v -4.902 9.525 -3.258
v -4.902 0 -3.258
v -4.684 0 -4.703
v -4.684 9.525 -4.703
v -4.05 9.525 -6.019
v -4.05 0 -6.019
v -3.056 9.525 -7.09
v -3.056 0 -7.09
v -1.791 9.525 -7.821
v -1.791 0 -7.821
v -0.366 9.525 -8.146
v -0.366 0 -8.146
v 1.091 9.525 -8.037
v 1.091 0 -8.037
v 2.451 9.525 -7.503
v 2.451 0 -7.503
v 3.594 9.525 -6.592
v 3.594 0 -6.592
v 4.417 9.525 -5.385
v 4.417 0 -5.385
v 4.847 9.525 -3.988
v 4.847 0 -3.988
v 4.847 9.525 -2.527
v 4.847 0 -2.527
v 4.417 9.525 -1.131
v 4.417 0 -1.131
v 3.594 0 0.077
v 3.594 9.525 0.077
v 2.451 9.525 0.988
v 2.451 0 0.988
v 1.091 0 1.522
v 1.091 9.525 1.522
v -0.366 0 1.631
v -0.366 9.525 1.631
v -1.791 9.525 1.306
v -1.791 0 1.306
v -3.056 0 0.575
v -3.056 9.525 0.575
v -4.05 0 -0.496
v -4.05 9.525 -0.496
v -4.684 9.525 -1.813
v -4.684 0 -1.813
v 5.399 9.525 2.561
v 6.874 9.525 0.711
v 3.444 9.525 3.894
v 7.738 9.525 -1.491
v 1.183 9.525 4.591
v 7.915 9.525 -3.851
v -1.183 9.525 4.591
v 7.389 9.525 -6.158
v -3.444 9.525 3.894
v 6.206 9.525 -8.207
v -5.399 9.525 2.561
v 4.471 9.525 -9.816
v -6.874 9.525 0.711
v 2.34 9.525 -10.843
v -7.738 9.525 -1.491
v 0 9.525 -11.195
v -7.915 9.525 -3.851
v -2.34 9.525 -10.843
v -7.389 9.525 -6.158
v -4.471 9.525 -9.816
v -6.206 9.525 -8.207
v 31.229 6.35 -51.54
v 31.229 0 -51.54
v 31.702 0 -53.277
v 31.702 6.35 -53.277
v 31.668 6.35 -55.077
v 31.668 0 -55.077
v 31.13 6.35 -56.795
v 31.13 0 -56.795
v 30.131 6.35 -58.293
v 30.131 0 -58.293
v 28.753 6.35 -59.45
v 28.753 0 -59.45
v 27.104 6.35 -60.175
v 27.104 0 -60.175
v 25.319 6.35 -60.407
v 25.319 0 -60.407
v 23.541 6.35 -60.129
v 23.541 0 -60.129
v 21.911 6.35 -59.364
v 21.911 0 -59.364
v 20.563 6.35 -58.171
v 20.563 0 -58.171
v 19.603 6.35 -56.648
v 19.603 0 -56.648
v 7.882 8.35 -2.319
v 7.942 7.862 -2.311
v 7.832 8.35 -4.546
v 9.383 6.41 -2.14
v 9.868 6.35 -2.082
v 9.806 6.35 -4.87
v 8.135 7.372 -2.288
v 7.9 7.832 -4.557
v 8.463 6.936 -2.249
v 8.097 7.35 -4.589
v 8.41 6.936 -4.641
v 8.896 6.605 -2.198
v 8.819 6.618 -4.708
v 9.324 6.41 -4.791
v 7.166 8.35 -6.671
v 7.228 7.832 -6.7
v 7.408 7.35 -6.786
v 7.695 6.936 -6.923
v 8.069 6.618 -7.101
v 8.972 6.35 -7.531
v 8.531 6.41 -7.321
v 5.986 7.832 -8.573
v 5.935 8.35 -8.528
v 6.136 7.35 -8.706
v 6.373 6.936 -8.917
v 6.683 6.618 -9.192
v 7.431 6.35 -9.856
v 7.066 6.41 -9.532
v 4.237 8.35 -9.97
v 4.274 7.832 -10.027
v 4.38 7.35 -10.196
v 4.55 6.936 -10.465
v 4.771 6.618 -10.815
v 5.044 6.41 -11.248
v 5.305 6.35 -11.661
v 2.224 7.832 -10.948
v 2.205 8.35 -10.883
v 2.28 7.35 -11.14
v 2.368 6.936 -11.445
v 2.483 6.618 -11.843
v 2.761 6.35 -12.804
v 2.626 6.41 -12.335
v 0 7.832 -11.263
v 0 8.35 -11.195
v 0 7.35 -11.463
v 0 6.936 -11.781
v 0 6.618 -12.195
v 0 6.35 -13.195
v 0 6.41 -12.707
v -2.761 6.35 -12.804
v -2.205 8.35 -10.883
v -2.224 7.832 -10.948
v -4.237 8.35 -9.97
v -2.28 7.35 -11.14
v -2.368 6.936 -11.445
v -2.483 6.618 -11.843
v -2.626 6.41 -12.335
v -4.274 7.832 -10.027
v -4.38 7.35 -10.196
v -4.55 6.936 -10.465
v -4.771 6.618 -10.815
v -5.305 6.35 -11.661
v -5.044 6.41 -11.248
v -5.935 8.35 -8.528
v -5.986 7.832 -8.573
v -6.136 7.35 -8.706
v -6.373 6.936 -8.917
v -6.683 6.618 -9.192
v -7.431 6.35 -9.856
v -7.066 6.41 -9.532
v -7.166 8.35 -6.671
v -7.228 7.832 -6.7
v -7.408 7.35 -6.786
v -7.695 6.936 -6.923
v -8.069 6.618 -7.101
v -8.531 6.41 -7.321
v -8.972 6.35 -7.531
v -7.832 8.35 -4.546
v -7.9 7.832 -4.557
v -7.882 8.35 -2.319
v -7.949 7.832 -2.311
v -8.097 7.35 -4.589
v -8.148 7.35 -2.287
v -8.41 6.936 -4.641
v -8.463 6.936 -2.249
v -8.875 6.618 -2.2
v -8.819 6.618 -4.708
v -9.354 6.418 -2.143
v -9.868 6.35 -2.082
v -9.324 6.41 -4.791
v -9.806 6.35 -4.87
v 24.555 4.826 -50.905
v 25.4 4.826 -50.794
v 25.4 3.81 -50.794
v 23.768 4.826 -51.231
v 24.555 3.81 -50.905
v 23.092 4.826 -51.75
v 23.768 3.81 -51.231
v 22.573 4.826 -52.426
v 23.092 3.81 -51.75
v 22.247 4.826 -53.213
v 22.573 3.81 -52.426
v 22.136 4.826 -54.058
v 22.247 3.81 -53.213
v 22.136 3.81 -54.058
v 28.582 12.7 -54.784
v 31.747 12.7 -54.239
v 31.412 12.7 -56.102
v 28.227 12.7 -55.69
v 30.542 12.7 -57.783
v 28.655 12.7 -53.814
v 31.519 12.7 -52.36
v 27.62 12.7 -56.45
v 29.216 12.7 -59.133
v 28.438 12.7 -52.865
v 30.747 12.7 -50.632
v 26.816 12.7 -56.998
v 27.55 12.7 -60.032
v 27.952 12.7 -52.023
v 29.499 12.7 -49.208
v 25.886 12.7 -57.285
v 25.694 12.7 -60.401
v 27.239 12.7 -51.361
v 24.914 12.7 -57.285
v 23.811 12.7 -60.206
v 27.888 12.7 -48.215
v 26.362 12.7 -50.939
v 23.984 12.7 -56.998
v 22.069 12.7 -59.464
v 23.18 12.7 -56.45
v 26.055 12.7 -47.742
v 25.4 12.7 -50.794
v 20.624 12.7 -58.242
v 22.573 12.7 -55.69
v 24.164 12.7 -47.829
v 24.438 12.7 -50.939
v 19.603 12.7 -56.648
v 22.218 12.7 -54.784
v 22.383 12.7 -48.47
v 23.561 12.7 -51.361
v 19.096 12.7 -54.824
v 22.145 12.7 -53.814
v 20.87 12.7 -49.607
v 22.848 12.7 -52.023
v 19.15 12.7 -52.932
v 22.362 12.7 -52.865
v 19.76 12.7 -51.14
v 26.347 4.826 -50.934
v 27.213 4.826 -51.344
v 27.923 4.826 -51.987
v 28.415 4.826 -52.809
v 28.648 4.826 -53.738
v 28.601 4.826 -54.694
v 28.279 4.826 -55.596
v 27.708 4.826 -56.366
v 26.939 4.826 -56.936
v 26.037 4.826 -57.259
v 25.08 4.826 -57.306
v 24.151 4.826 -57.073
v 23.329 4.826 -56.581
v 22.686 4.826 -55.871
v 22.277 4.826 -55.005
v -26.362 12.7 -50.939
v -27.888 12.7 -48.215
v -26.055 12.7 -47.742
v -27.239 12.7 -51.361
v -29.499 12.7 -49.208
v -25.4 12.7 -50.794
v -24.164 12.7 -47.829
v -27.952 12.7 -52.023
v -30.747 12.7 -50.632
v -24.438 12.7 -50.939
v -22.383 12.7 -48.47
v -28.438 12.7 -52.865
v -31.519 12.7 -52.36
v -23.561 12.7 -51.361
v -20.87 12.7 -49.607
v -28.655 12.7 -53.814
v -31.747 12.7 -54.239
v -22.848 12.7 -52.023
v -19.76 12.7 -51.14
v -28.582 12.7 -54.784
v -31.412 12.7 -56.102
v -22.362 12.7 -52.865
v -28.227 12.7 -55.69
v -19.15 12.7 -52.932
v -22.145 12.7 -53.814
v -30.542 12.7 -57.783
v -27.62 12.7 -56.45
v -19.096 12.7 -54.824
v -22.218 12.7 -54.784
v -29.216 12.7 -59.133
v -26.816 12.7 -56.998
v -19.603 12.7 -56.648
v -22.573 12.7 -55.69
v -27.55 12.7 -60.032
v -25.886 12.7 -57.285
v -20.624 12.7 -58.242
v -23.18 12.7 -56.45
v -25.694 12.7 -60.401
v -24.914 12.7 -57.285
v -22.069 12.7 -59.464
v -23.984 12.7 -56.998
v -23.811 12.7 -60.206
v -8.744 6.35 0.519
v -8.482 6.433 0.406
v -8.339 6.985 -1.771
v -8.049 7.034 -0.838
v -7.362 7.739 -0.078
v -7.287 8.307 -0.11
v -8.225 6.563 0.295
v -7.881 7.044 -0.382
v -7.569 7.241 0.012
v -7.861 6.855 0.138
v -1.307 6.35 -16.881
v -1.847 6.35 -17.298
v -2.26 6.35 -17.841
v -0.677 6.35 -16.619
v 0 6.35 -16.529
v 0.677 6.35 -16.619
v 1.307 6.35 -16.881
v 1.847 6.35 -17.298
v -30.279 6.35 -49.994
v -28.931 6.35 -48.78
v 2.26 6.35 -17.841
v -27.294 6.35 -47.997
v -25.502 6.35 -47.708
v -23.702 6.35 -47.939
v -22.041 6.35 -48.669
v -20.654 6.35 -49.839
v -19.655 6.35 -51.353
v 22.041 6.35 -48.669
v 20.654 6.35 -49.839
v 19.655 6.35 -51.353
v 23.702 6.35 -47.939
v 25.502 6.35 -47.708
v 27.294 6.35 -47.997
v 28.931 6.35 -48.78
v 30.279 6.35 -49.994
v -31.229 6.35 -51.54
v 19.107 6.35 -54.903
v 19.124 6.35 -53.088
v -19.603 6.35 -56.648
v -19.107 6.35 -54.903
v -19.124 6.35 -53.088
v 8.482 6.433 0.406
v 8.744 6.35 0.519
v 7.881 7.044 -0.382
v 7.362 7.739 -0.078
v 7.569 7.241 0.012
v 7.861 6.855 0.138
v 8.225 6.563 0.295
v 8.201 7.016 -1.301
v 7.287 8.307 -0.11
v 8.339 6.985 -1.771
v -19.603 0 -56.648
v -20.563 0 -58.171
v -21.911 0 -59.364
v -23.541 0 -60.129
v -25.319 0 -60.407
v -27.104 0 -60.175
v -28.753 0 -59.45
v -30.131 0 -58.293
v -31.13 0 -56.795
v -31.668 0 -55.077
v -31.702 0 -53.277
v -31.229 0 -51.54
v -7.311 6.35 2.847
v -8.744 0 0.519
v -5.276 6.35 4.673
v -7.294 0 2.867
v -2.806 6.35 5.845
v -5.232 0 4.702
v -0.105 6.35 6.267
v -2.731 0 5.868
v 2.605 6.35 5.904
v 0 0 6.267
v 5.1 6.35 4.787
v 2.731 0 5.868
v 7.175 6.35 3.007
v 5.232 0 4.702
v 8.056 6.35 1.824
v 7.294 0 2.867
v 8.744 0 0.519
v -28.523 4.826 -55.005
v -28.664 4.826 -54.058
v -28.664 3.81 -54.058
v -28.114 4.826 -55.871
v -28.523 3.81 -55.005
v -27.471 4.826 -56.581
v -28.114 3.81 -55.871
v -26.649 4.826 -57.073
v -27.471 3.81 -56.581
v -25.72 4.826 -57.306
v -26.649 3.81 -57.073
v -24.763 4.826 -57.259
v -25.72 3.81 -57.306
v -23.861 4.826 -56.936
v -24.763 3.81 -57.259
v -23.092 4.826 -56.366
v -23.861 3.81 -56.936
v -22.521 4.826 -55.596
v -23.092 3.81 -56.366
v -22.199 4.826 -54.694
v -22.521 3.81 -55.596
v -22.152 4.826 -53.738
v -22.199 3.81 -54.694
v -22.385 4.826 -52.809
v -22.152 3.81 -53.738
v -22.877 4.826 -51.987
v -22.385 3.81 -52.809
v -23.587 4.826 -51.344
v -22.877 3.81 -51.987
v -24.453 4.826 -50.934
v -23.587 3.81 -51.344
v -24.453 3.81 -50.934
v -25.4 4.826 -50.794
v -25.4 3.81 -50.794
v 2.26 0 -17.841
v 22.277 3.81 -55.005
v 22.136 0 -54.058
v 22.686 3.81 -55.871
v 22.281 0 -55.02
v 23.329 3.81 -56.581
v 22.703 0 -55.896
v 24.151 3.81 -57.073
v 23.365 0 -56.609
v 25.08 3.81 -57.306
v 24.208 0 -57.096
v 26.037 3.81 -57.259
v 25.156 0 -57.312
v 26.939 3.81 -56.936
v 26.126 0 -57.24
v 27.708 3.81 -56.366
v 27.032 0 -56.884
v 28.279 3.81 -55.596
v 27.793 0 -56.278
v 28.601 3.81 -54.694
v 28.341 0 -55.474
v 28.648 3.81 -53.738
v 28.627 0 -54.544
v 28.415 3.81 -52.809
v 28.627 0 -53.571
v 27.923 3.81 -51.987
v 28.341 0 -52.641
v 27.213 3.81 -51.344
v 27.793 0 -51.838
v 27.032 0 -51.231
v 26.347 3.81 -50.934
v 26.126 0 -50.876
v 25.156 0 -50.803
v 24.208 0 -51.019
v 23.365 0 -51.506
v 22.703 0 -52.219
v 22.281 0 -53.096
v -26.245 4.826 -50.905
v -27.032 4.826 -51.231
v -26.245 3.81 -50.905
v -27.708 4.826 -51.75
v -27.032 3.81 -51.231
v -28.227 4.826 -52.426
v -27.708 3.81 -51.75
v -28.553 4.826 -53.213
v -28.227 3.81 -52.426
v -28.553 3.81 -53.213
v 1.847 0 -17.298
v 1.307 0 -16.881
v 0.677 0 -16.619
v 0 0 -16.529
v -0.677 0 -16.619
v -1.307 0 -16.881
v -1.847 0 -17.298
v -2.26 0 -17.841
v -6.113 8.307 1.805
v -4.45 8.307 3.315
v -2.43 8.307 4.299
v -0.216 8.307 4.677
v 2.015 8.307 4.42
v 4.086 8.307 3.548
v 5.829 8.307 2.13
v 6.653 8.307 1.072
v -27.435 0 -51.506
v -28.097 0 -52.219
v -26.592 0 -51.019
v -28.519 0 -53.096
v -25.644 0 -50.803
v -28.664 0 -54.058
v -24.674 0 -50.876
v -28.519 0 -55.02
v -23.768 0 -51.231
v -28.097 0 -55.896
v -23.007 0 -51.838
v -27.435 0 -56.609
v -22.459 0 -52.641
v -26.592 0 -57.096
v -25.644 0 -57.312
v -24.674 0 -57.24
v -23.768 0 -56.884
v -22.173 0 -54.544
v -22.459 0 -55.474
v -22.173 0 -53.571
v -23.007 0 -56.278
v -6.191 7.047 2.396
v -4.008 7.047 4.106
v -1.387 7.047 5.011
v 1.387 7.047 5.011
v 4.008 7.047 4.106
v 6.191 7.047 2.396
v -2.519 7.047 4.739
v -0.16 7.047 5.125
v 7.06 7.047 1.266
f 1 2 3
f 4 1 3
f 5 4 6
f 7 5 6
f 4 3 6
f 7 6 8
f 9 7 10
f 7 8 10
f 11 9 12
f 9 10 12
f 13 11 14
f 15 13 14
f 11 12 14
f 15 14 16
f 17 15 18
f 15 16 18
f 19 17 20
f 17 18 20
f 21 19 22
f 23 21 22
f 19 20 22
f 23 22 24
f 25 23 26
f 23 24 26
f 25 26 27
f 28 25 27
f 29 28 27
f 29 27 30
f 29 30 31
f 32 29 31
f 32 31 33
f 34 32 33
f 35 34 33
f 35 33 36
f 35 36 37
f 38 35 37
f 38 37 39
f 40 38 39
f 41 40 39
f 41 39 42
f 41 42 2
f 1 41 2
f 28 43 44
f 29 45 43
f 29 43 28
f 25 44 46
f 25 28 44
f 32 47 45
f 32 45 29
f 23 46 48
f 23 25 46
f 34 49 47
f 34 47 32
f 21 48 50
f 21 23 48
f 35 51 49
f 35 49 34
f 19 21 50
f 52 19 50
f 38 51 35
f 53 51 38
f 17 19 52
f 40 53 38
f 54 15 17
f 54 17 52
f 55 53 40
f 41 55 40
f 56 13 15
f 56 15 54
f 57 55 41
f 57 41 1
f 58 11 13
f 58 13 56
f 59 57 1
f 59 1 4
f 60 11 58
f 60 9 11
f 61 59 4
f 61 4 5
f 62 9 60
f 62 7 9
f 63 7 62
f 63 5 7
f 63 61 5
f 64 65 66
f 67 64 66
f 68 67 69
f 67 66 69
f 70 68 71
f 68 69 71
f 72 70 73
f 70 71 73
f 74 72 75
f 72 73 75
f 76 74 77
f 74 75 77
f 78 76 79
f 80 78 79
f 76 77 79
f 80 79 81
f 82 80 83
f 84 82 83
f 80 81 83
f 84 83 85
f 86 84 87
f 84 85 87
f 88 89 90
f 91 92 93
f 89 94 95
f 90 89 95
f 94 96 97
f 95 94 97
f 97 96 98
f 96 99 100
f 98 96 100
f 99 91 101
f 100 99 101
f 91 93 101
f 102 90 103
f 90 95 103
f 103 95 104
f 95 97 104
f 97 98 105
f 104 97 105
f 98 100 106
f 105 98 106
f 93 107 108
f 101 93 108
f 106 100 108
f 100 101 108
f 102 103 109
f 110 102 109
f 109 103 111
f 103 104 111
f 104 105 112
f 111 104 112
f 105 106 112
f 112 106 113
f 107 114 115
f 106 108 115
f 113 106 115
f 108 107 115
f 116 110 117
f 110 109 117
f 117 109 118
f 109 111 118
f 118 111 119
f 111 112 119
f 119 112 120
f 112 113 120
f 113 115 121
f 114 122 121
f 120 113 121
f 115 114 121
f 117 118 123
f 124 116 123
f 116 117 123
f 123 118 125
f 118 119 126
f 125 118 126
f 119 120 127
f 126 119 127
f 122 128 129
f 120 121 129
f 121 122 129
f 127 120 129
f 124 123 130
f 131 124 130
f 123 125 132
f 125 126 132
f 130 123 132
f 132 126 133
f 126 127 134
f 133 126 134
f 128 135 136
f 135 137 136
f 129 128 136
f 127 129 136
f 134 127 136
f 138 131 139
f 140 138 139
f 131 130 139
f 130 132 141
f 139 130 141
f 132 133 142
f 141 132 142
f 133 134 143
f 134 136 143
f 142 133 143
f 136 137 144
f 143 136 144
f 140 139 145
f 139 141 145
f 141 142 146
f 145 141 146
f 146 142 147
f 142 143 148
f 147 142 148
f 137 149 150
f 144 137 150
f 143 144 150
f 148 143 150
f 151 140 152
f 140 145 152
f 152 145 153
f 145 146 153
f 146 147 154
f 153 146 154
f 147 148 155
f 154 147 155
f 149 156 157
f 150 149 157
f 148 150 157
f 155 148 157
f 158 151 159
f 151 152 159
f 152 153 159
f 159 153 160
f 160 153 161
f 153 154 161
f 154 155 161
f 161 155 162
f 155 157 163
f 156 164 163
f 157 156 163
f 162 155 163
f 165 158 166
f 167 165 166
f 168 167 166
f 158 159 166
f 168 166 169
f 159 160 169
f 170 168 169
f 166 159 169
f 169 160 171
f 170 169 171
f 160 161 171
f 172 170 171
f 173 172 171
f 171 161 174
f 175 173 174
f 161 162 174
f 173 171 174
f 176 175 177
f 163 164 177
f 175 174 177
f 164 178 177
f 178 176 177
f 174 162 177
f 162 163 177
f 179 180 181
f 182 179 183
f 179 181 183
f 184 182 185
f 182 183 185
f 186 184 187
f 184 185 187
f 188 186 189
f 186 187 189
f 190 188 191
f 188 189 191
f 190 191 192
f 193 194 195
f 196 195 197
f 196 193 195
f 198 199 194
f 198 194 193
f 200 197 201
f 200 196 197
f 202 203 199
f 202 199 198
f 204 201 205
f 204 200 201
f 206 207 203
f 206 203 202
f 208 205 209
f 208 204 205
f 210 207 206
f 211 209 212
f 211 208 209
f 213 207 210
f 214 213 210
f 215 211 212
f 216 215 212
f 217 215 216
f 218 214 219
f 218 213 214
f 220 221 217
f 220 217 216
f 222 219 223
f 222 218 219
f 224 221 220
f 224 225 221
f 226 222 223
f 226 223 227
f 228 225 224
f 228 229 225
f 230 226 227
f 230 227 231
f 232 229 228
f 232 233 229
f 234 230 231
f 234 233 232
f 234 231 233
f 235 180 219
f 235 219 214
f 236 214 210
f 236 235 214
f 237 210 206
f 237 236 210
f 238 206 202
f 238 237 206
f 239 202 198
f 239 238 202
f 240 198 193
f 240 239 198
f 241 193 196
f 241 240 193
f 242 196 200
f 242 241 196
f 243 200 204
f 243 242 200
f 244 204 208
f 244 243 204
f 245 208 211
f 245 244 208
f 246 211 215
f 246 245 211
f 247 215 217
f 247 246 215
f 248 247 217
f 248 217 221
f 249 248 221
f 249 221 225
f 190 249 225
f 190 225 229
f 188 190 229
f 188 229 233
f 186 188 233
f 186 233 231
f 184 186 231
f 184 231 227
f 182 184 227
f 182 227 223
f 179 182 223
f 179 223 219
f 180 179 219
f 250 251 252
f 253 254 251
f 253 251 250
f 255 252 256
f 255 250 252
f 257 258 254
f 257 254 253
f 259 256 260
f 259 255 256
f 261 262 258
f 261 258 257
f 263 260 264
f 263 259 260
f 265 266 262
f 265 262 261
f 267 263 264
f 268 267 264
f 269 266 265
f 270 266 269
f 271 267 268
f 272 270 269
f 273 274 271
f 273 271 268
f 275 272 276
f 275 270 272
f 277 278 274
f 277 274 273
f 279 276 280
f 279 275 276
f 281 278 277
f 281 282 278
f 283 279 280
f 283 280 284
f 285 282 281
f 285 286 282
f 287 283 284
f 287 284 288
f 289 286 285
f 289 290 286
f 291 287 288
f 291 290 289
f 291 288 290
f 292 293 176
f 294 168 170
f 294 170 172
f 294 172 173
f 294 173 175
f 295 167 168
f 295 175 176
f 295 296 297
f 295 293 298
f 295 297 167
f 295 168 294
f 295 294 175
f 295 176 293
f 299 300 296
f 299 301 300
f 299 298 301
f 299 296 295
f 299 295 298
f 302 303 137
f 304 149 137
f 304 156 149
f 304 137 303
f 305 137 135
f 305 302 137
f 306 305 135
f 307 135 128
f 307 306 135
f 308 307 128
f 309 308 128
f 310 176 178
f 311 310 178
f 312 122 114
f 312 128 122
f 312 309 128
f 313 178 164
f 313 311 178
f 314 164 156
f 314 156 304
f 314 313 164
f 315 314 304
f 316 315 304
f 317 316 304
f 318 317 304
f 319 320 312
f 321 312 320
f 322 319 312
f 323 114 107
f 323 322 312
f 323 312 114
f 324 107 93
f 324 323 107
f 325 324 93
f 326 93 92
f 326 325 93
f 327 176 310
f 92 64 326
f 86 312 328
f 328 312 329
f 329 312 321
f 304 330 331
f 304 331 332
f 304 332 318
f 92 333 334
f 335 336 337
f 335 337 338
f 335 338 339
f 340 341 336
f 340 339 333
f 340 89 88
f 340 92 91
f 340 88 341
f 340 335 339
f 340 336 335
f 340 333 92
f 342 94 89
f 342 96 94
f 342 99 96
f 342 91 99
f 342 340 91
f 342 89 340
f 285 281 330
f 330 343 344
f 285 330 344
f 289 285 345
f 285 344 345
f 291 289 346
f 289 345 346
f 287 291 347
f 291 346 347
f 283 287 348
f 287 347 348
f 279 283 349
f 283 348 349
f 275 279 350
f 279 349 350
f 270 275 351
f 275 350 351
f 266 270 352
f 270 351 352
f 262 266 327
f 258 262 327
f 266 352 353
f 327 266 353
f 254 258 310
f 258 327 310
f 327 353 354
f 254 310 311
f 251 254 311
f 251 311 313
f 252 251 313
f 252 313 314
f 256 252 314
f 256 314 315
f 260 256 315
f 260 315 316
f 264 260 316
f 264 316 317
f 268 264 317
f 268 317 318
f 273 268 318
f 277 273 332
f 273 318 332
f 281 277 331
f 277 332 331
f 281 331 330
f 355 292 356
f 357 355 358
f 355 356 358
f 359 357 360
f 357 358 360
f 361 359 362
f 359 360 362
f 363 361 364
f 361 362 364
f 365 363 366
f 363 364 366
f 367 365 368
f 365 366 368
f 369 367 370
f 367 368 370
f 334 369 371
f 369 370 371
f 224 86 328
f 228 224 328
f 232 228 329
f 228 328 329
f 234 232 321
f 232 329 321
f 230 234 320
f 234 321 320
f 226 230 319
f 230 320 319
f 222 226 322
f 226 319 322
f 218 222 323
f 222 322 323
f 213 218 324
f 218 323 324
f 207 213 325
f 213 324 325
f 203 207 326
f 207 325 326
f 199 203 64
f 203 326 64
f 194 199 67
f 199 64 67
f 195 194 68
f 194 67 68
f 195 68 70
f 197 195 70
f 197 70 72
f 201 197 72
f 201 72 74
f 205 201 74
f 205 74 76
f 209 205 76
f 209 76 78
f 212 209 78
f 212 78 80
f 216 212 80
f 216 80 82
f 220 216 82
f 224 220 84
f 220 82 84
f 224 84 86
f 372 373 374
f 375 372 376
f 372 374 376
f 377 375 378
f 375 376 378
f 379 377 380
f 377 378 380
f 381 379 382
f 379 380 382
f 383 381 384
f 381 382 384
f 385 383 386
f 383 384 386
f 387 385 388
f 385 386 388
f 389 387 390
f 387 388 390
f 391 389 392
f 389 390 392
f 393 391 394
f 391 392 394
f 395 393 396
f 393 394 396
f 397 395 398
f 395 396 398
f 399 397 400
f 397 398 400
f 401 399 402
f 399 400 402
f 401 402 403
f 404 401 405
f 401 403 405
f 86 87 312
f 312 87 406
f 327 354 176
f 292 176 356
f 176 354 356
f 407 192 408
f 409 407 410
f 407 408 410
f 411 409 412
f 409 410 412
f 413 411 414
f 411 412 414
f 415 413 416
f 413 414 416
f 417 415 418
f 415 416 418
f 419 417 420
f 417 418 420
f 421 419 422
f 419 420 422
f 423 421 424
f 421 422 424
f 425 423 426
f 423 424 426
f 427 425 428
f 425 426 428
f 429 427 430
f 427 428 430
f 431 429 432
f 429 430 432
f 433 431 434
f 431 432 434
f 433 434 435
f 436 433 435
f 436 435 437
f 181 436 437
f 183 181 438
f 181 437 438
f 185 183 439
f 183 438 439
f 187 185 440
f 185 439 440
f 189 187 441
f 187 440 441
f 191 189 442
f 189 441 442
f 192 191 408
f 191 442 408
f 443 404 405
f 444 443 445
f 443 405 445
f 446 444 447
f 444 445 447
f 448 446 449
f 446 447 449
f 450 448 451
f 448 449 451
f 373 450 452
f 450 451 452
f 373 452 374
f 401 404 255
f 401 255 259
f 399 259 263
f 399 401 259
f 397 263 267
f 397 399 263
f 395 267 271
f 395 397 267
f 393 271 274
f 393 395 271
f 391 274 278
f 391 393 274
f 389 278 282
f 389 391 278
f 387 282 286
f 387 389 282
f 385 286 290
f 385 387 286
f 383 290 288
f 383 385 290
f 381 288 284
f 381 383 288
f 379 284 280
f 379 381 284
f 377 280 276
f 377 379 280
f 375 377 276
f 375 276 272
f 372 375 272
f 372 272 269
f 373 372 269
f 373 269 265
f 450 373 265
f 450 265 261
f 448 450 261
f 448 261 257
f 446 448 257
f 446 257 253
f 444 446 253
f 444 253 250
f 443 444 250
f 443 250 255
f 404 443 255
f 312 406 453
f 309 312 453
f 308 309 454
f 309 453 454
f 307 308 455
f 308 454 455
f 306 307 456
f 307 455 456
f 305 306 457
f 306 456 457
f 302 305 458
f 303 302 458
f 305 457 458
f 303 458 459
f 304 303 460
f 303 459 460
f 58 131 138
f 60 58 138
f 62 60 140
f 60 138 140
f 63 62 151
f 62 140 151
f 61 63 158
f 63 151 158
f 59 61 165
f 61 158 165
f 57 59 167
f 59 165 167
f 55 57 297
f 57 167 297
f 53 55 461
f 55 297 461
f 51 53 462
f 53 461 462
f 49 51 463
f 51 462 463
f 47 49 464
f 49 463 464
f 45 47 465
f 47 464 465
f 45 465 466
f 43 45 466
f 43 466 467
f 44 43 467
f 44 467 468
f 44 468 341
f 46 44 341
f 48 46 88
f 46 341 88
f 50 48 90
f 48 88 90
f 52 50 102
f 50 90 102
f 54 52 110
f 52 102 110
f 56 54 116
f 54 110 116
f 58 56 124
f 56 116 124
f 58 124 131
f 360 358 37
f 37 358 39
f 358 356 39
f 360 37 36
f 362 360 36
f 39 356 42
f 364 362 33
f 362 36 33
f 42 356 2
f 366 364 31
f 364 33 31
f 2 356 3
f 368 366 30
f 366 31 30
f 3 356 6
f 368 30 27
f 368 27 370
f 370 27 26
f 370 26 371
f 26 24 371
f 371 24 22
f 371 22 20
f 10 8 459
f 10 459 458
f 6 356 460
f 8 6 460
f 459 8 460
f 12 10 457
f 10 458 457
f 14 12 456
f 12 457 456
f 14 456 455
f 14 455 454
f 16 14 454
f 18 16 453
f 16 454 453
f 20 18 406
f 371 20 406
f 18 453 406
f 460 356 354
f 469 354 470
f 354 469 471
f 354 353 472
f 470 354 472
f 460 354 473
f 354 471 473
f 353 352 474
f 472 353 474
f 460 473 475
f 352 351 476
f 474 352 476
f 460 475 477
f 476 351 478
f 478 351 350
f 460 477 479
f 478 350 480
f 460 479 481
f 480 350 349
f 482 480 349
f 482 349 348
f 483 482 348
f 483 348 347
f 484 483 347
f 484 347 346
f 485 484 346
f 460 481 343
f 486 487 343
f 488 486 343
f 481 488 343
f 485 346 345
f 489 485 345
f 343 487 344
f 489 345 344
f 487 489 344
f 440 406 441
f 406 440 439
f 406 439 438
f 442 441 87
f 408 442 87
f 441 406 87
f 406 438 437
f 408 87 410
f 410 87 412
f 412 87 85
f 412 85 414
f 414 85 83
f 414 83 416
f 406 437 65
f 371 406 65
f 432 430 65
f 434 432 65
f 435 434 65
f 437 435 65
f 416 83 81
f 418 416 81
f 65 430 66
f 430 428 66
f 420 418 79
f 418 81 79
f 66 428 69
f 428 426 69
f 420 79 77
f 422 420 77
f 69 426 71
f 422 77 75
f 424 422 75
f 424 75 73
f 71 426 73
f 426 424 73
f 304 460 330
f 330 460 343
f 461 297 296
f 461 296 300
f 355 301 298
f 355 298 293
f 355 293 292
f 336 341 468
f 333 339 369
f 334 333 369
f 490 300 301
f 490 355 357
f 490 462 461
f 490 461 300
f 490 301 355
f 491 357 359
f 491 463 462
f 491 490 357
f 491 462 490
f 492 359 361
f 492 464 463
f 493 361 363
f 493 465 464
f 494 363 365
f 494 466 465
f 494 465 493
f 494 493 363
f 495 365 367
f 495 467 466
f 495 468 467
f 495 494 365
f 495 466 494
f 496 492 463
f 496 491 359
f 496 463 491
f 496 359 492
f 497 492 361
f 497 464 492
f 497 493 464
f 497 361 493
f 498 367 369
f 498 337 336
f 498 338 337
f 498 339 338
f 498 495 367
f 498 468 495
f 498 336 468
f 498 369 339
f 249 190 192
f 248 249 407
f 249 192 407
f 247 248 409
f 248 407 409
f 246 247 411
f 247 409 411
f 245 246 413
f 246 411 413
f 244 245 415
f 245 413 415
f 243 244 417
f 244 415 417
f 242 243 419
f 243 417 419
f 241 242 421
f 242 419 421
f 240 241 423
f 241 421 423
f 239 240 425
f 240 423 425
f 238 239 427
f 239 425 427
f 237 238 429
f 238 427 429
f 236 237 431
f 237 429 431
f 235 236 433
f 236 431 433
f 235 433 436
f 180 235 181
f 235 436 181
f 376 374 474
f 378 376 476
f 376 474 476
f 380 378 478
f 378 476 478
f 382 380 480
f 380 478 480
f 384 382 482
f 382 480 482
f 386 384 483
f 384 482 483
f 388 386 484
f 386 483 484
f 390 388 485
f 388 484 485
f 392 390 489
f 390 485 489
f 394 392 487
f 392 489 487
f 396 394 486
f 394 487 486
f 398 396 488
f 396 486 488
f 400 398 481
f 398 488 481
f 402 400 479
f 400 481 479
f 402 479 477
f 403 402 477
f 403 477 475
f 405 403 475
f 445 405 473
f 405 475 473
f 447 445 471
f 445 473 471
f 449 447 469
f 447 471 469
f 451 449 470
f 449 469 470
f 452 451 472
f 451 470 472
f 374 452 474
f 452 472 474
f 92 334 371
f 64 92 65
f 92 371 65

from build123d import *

# Parameters (mm, degrees)
SKETCH1_R                            = 7.9375
BOSS_EXTRUDE1_DEPTH                  = 6.35
F_0_257_DIAMETER_HOLE1_D             = 6.5278
SKETCH1_3_R                          = 7.9375
BOSS_EXTRUDE2_DEPTH                  = 9.525
W_0_386_DIAMETER_HOLE1_D             = 9.8044
FILLET1_R                            = 2
F_25_64_0_39063_DIAMETER_HOLE1_D     = 9.922002
F_25_64_0_39063_DIAMETER_HOLE1_DEPTH = 1.524
BOSS_EXTRUDE3_DEPTH                  = 6.35
BOSS_EXTRUDE3_DEPTH_BACK             = 2.54
SKETCH12_R                           = 6.35
SKETCH12_R_2                         = 3.2639


with BuildPart() as part:
    # Sketch1 → Boss-Extrude1 (new body)
    with BuildSketch(Plane(origin=(0, 0, 0), x_dir=(1, 0, 0), z_dir=(0, 1, 0))):
        with BuildLine():
            ThreePointArc((2.26024053, 17.840513709), (0, 16.529128421), (-2.26024053, 17.840513709))
            Line((-2.26024053, 17.840513709), (-19.602540008, 56.648386542))
            ThreePointArc((-19.602540008, 56.648386542), (-27.954355314, 59.871226792), (-31.229481324, 51.539776269))
            Line((-31.229481324, 51.539776269), (-8.744221986, -0.519156562))
            ThreePointArc((-8.744221986, -0.519156562), (0, -6.267358068), (8.744221986, -0.519156562))
            Line((8.744221986, -0.519156562), (31.229481324, 51.539776269))
            ThreePointArc((31.229481324, 51.539776269), (27.954355314, 59.871226792), (19.602540008, 56.648386542))
            Line((19.602540008, 56.648386542), (2.26024053, 17.840513709))
        make_face()
        with Locations(Location((0, 3.257641932, 0), (0, 0, 270))):
            Circle(SKETCH1_R, mode=Mode.SUBTRACT)
    extrude(amount=BOSS_EXTRUDE1_DEPTH)

    # F (0.257) Diameter Hole1 (through all)
    with Locations(Plane(origin=(0, 6.35, 0), x_dir=(1, 0, 0), z_dir=(0, 1, 0))):
        with Locations((-25.4, 54.057641932), (25.4, 54.057641932)):
            Hole(F_0_257_DIAMETER_HOLE1_D / 2)

    # Sketch1<3> → Boss-Extrude2 (add)
    with BuildSketch(Plane(origin=(0, 0, 0), x_dir=(1, 0, 0), z_dir=(0, 1, 0))):
        with Locations(Location((0, 3.257641932, 0), (0, 0, 90))):
            Circle(SKETCH1_3_R)
    extrude(amount=BOSS_EXTRUDE2_DEPTH)

    # W (0.386) Diameter Hole1 (through all)
    with Locations(Plane(origin=(0, 9.525, 0), x_dir=(1, 0, 0), z_dir=(0, 1, 0))):
        with Locations((0, 3.257641932)):
            Hole(W_0_386_DIAMETER_HOLE1_D / 2)

    # Fillet1
    fillet1_edges = [part.edges().sort_by_distance(p)[0] for p in [
        (0, 6.35, 4.679858068),
    ]]
    fillet(fillet1_edges, radius=FILLET1_R)

    # 25/64 (0.39063) Diameter Hole1
    with Locations(Plane(origin=(0, 6.35, 0), x_dir=(1, 0, 0), z_dir=(0, 1, 0))):
        with Locations((-25.4, 54.057641932), (25.4, 54.057641932)):
            Hole(F_25_64_0_39063_DIAMETER_HOLE1_D / 2, depth=F_25_64_0_39063_DIAMETER_HOLE1_DEPTH)

    # Sketch12 → Boss-Extrude3 (add, two sides: drawn at the far end of the back side and taken through both)
    # profile 1 of 2: a face of its own
    with BuildSketch(Plane(origin=(0, 6.35, 0), x_dir=(1, 0, 0), z_dir=(0, 1, 0)).offset(-BOSS_EXTRUDE3_DEPTH_BACK)):
        with Locations(Location((25.4, 54.057641932, 0), (0, 0, 155.921287707))):
            Circle(SKETCH12_R)
        with Locations(Location((25.4, 54.057641932, 0), (0, 0, 270))):
            Circle(SKETCH12_R_2, mode=Mode.SUBTRACT)
    # profile 2 of 2: a face of its own
    with BuildSketch(Plane(origin=(0, 6.35, 0), x_dir=(1, 0, 0), z_dir=(0, 1, 0)).offset(-BOSS_EXTRUDE3_DEPTH_BACK)):
        with Locations(Location((-25.4, 54.057641932, 0), (0, 0, 24.078712293))):
            Circle(SKETCH12_R)
        with Locations(Location((-25.4, 54.057641932, 0), (0, 0, 270))):
            Circle(SKETCH12_R_2, mode=Mode.SUBTRACT)
    extrude(amount=BOSS_EXTRUDE3_DEPTH + BOSS_EXTRUDE3_DEPTH_BACK)


solid = part.part
